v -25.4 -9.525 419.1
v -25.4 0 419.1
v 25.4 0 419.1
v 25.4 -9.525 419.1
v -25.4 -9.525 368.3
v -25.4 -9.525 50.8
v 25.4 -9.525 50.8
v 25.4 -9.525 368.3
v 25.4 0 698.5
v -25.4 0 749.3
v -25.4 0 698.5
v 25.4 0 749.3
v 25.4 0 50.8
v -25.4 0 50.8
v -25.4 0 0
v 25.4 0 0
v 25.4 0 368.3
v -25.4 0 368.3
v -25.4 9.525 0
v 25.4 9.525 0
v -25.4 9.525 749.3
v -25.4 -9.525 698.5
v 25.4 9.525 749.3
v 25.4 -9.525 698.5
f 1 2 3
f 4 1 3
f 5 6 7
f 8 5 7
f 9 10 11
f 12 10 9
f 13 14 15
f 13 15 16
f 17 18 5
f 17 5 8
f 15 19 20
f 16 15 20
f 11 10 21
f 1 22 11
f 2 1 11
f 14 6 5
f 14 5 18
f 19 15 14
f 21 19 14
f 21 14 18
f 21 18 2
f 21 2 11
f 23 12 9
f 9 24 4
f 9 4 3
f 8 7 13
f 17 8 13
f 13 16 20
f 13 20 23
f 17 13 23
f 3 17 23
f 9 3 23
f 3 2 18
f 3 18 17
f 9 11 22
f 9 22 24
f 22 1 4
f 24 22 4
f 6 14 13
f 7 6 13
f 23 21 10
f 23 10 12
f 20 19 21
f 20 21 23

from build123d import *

# Parameters (mm, degrees)
F0_W     = 50.8
F0_H     = 19.05
F1_DEPTH = 749.3
F2_W     = 122.435573
F2_H     = 50.8
F2_W_2   = 93.867282
F2_W_3   = 343.160421
F3_DEPTH = 25.4


with BuildPart() as f1:
    # F0 (on Top) → F1 (new body)
    with BuildSketch(Plane.XY):
        Rectangle(F0_W, F0_H)
    extrude(amount=F1_DEPTH)

    # F2 (on Front) → F3 (cut)
    with BuildSketch(Plane.XZ):
        with Locations((22.446524, 25.4)):
            Rectangle(F2_W, F2_H)
        with Locations((2.720783, 393.7)):
            Rectangle(F2_W_2, F2_H)
        with Locations((-38.781822, 723.9)):
            Rectangle(F2_W_3, F2_H)
    extrude(amount=F3_DEPTH, mode=Mode.SUBTRACT)


solid = f1.part
